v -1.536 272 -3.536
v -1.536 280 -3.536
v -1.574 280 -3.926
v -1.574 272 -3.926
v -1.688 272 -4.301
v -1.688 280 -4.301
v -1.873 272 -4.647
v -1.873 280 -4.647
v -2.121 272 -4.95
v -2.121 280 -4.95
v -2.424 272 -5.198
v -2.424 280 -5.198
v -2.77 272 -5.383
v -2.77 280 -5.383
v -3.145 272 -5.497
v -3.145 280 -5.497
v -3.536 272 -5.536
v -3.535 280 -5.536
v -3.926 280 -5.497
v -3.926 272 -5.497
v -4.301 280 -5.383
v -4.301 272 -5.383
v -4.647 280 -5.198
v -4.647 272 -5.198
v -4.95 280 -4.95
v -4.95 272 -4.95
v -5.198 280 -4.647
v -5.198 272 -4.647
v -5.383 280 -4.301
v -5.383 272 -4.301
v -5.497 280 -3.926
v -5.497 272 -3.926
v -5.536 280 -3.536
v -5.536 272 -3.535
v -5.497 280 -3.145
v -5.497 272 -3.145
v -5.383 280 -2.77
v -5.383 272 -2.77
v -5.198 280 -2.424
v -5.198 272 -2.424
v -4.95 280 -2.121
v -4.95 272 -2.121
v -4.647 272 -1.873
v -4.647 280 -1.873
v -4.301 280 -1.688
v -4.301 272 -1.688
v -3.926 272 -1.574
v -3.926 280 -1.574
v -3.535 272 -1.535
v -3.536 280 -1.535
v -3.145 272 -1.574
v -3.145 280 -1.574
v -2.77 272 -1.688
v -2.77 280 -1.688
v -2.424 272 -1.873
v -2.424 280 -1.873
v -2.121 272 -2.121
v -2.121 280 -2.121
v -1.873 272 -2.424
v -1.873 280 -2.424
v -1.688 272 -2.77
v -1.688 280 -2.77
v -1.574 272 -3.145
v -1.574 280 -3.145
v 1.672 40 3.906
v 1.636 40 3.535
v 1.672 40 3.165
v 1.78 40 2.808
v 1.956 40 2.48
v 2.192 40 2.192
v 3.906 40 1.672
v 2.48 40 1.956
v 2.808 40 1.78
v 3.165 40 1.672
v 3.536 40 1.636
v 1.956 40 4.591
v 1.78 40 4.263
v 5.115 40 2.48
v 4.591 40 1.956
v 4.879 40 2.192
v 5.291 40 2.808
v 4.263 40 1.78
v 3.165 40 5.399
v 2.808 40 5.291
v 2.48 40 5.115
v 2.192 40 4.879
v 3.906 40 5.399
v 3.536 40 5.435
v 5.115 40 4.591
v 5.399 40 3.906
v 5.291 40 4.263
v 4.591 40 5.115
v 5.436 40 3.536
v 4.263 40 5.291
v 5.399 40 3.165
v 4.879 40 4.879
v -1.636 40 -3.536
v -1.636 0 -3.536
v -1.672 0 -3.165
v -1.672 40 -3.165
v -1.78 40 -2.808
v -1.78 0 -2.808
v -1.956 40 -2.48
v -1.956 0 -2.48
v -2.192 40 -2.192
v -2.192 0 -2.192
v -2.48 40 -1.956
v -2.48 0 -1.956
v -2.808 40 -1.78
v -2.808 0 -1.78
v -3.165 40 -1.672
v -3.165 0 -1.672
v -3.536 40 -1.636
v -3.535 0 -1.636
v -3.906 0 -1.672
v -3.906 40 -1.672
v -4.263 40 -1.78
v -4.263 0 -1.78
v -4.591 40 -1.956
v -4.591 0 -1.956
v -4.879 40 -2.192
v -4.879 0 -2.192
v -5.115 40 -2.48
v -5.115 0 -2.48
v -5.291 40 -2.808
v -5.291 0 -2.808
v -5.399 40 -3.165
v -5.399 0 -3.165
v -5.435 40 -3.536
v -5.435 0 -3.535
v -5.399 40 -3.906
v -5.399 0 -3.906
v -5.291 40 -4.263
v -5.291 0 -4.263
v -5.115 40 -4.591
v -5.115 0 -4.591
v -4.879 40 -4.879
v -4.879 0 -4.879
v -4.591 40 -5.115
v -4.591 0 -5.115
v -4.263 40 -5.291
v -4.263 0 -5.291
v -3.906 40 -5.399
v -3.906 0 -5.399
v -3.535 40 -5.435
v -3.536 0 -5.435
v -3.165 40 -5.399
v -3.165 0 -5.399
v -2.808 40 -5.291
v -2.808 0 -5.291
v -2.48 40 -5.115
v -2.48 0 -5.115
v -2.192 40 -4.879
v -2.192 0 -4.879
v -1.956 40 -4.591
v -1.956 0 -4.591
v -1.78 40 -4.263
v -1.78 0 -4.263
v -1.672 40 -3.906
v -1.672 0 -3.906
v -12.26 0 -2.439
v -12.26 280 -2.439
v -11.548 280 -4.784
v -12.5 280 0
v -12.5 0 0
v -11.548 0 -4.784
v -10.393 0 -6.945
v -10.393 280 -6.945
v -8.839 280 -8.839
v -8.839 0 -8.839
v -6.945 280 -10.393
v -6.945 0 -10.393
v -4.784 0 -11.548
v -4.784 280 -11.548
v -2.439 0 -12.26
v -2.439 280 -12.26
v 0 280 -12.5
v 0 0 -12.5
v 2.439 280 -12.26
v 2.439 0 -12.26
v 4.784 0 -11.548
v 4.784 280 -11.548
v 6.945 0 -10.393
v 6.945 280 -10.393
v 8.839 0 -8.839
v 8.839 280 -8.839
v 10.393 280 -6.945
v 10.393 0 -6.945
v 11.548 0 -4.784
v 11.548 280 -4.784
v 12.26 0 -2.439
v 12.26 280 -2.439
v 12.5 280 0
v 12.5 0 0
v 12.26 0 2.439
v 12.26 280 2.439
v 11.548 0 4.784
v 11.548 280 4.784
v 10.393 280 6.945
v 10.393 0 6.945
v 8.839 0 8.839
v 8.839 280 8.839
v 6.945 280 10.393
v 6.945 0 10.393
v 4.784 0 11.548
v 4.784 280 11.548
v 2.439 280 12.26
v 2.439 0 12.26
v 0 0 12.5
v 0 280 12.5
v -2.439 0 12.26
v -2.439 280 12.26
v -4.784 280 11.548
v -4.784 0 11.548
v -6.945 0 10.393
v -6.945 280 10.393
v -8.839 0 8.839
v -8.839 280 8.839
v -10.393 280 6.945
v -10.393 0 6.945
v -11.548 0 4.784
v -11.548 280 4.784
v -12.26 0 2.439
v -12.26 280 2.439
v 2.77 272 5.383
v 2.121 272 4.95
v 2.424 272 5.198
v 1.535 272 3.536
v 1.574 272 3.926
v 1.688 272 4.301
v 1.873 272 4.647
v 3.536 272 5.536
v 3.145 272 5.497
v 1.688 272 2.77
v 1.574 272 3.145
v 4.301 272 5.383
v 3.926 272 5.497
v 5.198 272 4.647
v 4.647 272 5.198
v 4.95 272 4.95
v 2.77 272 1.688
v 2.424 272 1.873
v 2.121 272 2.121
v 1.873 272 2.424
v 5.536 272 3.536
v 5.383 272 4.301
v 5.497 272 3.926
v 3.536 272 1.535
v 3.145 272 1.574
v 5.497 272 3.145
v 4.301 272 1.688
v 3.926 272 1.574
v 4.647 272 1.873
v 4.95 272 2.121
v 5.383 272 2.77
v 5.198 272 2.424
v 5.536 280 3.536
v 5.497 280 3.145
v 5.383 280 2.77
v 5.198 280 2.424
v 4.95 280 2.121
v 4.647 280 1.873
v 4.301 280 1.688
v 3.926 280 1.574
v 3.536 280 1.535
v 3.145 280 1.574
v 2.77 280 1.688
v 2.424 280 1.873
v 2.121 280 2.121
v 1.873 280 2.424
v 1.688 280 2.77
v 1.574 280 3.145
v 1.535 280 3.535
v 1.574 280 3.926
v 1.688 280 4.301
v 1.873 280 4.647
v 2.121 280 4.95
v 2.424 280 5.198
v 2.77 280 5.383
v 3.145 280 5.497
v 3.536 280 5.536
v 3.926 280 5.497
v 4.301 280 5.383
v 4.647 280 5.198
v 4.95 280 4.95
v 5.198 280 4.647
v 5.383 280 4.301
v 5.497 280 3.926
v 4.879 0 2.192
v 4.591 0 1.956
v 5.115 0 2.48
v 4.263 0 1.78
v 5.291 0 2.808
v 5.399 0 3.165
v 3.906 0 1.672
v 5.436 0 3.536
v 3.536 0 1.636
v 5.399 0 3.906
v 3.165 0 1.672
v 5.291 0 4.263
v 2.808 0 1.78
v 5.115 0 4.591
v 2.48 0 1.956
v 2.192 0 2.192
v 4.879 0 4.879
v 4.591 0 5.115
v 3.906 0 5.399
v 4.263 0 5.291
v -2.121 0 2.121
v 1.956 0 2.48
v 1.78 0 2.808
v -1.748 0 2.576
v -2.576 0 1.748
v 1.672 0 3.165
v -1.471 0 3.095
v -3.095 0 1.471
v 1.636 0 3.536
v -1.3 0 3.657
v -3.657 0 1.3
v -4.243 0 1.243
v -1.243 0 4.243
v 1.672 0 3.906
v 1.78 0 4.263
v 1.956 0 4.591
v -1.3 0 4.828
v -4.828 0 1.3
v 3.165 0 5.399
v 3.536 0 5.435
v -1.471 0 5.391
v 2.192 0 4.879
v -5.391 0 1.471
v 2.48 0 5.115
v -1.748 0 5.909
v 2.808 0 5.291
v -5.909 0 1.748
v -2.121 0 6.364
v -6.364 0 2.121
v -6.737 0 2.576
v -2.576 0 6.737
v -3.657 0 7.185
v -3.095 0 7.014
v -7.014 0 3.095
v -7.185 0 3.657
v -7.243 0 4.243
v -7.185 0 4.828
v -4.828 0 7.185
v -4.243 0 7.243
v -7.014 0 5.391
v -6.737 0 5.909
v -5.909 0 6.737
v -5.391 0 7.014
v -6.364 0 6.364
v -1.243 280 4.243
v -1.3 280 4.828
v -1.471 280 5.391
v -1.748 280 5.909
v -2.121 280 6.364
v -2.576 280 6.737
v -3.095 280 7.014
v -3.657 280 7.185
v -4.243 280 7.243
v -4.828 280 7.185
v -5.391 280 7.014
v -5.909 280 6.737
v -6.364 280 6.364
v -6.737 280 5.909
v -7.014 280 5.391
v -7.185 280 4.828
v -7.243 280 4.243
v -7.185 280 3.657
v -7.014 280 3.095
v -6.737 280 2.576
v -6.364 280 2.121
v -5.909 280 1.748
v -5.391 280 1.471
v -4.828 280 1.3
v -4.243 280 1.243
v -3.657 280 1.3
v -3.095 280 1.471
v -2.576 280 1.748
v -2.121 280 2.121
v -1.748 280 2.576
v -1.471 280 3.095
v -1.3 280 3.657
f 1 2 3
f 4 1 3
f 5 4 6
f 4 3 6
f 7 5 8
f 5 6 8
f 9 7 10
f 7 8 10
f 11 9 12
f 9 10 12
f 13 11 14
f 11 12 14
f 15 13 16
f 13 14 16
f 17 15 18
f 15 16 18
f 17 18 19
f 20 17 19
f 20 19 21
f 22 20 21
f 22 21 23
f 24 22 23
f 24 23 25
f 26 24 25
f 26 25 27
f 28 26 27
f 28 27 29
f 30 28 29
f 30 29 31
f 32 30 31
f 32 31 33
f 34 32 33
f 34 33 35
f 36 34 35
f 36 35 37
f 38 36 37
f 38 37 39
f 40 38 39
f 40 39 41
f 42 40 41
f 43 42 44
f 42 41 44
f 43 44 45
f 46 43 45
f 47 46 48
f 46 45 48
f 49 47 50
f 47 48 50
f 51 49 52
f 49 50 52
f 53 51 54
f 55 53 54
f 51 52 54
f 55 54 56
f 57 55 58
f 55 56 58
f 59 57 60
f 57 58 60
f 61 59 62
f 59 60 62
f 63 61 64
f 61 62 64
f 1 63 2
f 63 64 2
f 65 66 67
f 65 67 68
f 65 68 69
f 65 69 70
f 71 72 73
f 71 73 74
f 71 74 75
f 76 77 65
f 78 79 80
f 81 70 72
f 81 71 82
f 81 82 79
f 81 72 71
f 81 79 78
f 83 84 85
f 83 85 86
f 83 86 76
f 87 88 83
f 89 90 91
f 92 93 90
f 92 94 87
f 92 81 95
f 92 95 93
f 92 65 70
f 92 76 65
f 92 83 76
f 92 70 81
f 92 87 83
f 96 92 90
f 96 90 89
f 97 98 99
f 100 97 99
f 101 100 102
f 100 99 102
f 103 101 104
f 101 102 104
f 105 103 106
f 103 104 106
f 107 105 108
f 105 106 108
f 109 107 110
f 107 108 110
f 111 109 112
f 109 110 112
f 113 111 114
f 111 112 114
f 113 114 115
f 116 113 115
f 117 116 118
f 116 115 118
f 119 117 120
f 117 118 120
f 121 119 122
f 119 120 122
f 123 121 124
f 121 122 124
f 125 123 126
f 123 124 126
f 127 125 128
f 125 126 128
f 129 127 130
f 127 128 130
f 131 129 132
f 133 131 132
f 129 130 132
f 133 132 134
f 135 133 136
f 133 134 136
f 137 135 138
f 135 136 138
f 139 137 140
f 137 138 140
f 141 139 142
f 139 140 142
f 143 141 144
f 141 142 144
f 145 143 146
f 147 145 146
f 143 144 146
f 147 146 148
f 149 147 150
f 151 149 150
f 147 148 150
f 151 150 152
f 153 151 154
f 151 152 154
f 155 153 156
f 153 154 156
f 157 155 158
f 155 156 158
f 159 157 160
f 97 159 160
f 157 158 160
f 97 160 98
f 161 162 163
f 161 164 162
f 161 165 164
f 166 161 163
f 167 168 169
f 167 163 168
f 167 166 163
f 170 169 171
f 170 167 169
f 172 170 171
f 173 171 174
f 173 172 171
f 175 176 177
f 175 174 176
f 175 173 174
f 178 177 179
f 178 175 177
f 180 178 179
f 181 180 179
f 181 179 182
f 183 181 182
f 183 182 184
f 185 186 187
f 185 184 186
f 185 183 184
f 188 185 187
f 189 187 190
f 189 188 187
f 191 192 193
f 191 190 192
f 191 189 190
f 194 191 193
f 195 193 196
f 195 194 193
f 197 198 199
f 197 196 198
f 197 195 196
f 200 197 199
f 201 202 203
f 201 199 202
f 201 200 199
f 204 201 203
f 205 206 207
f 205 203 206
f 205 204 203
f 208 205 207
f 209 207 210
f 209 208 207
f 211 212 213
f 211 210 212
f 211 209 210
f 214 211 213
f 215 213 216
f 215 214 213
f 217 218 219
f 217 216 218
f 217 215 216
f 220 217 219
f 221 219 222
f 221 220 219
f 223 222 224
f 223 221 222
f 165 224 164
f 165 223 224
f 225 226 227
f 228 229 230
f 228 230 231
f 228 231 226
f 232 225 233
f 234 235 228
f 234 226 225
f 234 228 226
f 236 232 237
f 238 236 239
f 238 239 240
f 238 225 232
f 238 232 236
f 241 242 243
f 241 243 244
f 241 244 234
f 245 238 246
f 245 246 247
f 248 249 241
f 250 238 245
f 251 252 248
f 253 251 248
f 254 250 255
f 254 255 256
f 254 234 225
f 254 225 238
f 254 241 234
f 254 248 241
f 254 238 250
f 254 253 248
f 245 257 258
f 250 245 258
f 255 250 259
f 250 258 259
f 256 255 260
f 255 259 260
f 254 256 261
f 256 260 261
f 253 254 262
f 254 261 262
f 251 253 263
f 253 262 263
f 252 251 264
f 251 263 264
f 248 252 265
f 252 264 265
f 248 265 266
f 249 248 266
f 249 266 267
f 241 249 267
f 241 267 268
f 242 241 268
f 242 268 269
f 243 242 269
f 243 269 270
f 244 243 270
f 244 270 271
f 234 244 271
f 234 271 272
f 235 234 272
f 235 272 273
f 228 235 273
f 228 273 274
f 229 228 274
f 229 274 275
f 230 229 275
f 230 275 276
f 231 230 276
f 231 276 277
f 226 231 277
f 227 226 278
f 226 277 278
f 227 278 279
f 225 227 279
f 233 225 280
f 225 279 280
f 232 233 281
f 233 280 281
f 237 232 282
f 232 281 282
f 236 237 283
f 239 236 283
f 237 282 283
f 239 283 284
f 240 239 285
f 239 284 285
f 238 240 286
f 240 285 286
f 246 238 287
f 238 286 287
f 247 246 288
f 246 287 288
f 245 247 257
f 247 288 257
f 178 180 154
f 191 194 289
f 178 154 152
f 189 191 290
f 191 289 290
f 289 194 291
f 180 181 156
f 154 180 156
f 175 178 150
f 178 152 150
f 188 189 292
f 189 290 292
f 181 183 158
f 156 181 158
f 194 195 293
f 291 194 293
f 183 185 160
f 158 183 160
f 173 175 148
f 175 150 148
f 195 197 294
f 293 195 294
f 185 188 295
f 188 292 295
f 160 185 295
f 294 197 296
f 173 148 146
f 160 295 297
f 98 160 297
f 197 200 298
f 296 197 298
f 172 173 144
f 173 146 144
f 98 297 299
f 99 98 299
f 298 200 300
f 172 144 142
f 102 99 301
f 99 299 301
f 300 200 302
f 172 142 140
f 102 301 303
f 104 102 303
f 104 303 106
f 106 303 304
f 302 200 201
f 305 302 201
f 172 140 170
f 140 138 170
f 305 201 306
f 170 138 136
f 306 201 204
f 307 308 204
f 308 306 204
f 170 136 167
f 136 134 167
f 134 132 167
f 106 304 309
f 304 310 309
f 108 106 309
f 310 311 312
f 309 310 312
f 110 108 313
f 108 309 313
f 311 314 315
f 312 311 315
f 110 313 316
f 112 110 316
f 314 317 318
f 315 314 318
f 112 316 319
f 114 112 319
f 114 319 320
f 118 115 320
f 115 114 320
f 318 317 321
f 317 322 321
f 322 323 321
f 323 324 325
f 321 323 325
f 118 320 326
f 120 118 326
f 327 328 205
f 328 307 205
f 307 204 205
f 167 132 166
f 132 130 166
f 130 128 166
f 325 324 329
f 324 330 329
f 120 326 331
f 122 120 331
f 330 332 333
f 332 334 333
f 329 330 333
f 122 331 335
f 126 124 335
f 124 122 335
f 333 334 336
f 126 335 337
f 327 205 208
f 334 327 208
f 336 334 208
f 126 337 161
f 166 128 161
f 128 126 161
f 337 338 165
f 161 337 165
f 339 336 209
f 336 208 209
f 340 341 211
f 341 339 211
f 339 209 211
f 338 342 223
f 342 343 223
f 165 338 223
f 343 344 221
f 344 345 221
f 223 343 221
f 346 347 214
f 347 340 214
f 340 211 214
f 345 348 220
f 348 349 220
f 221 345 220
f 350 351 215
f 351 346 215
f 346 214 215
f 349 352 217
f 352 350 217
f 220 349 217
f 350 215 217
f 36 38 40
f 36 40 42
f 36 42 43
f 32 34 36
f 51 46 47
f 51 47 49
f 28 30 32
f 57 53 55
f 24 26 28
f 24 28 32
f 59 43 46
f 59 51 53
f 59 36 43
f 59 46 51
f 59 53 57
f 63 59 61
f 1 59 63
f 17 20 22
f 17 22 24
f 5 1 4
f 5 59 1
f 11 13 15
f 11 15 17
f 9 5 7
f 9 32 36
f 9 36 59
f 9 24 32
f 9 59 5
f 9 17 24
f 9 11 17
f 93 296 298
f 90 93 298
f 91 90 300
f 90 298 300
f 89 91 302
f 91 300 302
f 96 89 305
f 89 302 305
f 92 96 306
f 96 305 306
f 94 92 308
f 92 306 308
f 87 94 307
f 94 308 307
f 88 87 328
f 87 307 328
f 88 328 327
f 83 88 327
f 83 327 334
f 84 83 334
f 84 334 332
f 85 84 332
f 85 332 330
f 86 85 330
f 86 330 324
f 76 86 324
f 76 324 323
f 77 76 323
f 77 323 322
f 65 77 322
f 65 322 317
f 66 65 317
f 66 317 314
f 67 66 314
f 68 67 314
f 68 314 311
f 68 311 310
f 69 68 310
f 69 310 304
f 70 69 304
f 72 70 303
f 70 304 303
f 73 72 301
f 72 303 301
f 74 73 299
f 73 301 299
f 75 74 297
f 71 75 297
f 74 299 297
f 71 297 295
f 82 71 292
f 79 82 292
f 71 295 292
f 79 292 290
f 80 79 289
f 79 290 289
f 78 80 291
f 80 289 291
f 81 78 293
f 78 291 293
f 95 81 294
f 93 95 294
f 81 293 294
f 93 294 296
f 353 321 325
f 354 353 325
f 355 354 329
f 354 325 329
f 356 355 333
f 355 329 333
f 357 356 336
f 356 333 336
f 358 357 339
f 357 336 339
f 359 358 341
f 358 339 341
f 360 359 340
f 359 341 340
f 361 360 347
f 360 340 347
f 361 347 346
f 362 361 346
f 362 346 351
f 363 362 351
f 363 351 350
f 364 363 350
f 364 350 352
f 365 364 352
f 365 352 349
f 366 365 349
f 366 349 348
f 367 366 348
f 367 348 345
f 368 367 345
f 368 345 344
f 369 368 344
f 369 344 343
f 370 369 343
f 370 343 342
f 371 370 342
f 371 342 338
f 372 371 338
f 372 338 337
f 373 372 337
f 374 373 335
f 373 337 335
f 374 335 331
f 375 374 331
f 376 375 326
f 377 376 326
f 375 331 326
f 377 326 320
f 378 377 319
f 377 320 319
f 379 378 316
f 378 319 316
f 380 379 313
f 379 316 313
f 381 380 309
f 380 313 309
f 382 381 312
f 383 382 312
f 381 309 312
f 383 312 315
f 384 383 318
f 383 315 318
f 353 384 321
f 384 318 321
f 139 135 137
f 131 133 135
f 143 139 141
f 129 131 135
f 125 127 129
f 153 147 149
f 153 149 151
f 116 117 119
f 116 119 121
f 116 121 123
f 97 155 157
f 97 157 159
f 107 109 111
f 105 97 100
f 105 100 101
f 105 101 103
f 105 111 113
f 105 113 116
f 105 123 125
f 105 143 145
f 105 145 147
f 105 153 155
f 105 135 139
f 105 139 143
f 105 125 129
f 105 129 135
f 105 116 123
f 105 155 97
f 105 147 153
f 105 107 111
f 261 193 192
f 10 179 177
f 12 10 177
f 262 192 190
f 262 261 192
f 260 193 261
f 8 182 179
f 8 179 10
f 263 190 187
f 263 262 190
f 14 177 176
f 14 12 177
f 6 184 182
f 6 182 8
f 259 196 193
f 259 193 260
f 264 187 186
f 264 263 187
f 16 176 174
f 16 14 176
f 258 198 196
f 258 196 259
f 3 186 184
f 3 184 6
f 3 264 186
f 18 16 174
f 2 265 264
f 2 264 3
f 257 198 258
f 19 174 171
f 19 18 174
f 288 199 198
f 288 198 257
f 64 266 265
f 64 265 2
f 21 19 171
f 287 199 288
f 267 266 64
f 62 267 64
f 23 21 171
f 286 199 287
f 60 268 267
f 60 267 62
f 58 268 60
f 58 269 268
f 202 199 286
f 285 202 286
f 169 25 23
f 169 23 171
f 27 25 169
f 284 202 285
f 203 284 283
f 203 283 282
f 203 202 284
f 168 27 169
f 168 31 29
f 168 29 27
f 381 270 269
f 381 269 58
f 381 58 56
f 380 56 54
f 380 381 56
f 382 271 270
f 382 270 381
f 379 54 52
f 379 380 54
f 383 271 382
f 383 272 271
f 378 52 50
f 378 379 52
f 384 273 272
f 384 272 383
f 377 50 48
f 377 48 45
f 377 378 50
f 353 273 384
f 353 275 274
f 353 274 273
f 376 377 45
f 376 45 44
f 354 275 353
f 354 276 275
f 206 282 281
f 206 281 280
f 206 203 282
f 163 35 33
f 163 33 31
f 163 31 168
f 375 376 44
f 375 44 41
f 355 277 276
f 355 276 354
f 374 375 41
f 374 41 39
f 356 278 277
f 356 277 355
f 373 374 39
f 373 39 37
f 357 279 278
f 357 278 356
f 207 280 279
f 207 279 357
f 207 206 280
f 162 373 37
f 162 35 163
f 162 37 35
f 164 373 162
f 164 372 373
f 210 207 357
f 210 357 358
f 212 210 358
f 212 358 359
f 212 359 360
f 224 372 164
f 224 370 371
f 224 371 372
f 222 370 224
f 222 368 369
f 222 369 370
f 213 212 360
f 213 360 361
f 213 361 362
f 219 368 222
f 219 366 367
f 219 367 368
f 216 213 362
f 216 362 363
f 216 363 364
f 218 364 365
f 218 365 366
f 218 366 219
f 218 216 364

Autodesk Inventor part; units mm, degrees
ref_plane "YZ Plane" through (0, 0, 0) normal (1, 0, 0) x (0, 1, 0)
ref_plane "XZ Plane" through (0, 0, 0) normal (0, 1, 0) x (-1, 0, 0)
ref_plane "XY Plane" through (0, 0, 0) normal (0, 0, 1) x (1, 0, 0)
sketch "Sketch1" plane through (0, 0, 0) normal (0, 1, 0) x (-1, 0, 0)
  circle A0 centre (0, 0) radius 12.5
  dimension "d0" = 25
extrude "Extrusion1" add sketch "Sketch1" along normal blind 280
sketch "Sketch2" plane through (0, 0, 0) normal (0, -1, 0) x (1, 0, 0)
  line L0 (-3.5355, -3.5355) -> (3.5355, 3.5355)
  line L1 (-3.5355, -3.5355) -> (6.4645, -3.5355) construction
  circle A0 centre (-3.5355, -3.5355) radius 1.9
  circle A1 centre (3.5355, 3.5355) radius 1.9
  point P0 (0, 0)
  dimension "d3" = 10
  dimension "d4" = 45
  dimension "d5" = 3.8
  dimension "d6" = 3.8
extrude "Extrusion2" cut sketch "Sketch2" against normal blind 40
sketch "Sketch3" plane through (0, 0, 0) normal (0, -1, 0) x (1, 0, 0)
  line L0 (0, 0) -> (-4.2426, 4.2426)
  line L1 (0, 0) -> (6, 0) construction
  circle A0 centre (-4.2426, 4.2426) radius 3
  dimension "d9" = 6
  dimension "d10" = 135
  dimension "d11" = 6
extrude "Extrusion3" cut sketch "Sketch3" against normal through all
sketch "Sketch6" plane through (0, 280, 0) normal (0, 1, 0) x (1, 0, 0)
  circle A0 centre (-3.5355, -3.5355) radius 1.9 construction
  circle A1 centre (3.5355, 3.5355) radius 1.9 construction
  line L0 (-3.5355, 3.5355) -> (3.5355, -3.5355)
  line L1 (-3.5355, 3.5355) -> (6.4645, 3.5355) construction
  circle A2 centre (3.5355, -3.5355) radius 2
  circle A3 centre (-3.5355, 3.5355) radius 2
  point P0 (0, 0)
  dimension "d16" = 10
  dimension "d17" = 45
  dimension "d18" = 4
  dimension "d19" = 4
extrude "Extrusion4" cut sketch "Sketch6" against normal blind 8
properties part number "Dowel2"
